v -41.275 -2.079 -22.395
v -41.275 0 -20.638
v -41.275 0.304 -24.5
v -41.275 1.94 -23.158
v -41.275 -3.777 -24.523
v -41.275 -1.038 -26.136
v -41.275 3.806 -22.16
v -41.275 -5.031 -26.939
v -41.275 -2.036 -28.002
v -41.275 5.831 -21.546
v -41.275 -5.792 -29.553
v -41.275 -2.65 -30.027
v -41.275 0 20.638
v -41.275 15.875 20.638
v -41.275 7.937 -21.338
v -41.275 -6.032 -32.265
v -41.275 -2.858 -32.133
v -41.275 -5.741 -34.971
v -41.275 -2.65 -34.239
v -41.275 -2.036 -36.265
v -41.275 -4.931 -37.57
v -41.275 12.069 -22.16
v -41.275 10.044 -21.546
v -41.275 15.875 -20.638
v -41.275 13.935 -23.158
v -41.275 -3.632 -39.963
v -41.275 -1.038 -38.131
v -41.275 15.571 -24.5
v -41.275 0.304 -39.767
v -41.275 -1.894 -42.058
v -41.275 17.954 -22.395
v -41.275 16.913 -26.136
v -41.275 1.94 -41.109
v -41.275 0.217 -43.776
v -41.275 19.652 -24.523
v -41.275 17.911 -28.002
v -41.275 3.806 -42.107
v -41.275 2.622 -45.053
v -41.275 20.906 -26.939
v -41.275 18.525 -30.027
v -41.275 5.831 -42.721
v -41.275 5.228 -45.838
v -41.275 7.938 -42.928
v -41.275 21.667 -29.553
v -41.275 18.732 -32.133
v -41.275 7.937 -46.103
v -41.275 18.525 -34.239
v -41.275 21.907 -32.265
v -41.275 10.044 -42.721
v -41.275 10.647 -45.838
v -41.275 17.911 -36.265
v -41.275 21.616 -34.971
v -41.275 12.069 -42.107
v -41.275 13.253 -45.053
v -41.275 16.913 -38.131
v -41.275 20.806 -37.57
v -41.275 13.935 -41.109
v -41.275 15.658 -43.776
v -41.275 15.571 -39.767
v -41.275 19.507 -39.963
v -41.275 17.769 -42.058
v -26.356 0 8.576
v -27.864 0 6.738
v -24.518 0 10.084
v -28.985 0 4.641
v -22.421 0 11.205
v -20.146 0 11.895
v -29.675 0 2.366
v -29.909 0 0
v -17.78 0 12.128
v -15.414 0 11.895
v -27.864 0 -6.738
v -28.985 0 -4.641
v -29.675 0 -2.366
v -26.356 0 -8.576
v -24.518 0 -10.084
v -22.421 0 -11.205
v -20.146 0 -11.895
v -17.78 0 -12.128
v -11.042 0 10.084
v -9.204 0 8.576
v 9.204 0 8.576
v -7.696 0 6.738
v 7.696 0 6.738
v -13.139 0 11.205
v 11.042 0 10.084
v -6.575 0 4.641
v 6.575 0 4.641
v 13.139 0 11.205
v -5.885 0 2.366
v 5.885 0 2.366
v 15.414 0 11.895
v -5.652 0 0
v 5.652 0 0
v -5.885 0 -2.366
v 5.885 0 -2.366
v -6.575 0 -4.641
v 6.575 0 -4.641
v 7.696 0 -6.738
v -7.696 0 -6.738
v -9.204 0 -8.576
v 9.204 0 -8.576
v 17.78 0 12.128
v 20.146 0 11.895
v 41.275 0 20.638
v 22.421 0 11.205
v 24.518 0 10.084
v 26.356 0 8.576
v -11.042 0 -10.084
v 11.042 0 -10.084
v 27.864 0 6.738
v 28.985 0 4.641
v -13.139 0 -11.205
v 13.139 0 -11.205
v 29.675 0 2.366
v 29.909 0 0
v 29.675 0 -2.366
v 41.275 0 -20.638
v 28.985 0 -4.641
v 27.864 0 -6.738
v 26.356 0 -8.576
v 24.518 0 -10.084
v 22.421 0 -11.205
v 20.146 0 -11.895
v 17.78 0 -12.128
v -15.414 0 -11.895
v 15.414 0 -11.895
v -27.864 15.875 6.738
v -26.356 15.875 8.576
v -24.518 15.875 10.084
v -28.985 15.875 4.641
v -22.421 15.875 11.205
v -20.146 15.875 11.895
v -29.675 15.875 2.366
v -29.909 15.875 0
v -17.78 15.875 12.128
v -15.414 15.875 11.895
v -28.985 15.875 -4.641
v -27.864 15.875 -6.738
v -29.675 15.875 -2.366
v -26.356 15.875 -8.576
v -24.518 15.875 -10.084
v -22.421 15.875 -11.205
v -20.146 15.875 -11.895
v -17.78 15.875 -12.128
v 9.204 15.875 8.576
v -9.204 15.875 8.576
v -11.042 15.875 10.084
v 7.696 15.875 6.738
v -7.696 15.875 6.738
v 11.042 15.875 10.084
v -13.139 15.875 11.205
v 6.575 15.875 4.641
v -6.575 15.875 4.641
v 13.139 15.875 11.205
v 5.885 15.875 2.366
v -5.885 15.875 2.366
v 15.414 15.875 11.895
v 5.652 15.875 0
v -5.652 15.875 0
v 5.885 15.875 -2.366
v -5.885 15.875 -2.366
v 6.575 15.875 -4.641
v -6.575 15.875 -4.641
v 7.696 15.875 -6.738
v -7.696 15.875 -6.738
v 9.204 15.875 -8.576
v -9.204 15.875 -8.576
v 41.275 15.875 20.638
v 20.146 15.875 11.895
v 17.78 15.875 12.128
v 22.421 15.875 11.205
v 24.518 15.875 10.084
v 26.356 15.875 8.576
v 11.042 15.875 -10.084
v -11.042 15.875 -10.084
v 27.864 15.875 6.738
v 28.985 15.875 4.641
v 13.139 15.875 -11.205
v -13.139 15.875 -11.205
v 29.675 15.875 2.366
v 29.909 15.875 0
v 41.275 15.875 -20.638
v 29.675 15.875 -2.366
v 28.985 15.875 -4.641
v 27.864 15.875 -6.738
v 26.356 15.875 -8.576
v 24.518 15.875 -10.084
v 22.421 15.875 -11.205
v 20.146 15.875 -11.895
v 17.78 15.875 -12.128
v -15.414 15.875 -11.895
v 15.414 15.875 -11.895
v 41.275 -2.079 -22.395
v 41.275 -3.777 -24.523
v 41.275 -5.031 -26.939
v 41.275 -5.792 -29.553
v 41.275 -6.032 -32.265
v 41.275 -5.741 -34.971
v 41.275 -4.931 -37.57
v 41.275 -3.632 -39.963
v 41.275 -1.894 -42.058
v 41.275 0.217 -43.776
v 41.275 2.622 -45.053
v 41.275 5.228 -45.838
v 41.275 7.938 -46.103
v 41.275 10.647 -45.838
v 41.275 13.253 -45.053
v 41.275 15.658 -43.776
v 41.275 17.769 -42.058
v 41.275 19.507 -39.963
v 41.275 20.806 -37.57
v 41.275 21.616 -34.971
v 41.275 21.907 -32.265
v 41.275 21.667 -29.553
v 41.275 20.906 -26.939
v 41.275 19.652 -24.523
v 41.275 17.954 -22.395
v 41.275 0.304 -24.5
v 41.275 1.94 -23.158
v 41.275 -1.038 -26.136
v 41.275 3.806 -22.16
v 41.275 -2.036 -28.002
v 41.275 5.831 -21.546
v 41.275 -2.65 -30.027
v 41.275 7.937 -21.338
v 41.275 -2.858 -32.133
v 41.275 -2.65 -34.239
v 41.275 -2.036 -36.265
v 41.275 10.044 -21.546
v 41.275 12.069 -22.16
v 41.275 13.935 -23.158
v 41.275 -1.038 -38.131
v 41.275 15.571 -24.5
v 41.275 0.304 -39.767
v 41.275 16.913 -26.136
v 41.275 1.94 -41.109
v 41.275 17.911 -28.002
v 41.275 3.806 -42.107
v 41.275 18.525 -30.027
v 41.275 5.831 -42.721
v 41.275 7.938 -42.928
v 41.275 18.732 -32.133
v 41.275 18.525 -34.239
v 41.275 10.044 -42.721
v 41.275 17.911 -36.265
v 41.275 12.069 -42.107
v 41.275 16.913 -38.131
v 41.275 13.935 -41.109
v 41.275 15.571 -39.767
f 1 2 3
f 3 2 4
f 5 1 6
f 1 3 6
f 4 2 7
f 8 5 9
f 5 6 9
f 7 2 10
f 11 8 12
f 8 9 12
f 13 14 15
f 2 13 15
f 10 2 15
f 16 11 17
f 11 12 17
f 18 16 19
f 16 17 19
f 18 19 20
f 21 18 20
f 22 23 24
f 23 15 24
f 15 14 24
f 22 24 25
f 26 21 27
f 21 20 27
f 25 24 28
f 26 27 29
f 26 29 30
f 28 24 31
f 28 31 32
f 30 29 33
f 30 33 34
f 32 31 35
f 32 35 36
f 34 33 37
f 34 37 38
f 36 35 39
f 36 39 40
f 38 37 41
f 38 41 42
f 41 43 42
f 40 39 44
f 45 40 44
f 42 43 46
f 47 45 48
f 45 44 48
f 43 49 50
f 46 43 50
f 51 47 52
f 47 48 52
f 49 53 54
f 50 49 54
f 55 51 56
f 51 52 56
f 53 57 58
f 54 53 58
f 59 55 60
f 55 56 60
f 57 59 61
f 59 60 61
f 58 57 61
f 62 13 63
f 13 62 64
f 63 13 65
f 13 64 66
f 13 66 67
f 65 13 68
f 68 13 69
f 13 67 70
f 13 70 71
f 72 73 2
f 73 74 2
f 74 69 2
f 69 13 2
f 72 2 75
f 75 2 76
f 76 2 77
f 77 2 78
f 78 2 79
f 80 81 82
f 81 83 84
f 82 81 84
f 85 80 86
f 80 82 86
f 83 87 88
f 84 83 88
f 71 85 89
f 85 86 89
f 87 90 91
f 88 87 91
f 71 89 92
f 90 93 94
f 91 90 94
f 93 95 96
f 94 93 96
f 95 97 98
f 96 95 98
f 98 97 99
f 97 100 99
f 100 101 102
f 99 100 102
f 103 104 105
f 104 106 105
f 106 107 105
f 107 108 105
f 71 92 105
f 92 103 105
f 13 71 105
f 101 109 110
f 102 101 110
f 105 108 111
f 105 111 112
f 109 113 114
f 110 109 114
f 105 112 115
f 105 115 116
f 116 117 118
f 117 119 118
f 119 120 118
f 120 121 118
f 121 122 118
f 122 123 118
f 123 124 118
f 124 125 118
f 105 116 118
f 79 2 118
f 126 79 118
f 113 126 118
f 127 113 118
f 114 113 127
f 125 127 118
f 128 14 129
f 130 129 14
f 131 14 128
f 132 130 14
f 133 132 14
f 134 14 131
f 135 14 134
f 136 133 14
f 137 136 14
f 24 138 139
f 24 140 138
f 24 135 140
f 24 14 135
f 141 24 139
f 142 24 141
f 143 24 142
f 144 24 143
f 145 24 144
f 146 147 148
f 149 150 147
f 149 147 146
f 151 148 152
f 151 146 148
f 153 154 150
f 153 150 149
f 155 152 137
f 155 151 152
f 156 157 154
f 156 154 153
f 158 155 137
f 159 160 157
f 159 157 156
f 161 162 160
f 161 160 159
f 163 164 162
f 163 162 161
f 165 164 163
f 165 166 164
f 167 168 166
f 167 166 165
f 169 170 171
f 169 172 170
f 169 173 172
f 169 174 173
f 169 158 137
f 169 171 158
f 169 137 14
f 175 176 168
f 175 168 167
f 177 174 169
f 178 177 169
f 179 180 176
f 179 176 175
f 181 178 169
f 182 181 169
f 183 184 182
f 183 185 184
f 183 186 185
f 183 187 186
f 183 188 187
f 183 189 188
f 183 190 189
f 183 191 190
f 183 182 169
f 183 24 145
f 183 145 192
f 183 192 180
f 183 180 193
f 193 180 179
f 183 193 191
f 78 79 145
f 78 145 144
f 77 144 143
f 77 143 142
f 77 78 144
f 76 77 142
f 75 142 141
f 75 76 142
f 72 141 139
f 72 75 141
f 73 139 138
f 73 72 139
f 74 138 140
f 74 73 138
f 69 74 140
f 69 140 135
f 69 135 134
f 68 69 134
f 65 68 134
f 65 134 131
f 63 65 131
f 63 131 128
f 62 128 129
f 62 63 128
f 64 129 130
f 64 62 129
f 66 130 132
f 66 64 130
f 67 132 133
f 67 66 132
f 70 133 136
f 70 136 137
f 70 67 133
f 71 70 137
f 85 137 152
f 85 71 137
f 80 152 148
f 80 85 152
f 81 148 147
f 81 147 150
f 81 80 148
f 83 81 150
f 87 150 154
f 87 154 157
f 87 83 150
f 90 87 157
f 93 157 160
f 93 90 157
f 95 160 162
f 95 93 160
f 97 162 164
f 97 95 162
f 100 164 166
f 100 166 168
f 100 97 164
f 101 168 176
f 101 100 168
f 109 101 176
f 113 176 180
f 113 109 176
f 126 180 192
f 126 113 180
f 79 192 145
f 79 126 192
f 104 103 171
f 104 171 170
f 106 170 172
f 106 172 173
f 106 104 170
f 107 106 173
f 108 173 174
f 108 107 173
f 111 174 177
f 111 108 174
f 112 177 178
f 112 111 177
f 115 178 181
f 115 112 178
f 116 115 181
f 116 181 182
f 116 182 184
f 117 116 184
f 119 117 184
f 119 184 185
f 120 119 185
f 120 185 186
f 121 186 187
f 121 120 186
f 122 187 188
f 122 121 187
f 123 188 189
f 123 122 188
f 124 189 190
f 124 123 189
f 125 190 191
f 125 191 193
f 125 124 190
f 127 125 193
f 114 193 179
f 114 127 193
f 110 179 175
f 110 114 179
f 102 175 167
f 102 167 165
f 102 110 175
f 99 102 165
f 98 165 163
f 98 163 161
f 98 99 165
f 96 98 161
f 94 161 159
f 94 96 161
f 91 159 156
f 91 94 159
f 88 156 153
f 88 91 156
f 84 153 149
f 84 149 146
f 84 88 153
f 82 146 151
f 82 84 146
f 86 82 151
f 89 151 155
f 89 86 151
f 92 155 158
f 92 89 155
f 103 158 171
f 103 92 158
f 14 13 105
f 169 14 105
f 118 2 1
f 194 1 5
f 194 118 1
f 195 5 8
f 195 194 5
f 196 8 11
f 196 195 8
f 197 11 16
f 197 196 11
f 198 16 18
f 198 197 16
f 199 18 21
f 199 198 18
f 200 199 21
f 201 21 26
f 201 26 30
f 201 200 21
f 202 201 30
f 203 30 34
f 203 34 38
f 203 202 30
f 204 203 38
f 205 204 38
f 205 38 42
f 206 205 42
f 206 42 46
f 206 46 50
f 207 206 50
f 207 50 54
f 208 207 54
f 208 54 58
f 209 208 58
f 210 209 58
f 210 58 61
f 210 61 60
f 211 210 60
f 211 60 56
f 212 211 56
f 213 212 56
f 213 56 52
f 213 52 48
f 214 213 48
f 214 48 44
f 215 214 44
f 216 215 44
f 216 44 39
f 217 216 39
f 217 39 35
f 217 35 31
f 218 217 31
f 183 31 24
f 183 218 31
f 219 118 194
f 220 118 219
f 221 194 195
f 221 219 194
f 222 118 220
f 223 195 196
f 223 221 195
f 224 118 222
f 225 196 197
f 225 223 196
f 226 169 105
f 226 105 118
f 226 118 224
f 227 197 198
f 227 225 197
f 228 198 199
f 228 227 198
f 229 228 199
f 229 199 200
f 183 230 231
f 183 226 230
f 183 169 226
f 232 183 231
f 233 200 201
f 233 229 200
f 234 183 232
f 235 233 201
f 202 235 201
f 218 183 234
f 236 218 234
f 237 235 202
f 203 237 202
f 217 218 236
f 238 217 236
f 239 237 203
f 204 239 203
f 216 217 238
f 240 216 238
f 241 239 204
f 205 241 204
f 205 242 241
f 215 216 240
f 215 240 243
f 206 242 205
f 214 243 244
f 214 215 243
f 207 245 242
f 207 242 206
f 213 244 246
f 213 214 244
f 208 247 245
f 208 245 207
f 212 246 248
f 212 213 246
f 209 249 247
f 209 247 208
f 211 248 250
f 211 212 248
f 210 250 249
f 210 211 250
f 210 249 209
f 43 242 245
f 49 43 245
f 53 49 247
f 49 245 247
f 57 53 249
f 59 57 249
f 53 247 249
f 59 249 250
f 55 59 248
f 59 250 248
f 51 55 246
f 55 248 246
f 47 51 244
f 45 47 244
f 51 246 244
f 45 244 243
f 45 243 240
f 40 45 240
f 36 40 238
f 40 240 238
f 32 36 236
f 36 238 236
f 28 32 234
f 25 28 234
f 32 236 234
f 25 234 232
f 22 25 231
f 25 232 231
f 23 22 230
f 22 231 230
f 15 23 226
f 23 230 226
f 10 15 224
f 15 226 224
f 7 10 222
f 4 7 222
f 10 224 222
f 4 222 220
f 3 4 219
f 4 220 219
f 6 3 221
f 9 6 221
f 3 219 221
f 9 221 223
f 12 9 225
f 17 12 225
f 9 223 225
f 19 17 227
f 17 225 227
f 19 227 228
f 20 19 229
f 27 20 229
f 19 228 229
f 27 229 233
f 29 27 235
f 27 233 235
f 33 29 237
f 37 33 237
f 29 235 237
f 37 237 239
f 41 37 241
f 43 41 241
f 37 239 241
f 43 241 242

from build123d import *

# Parameters (mm, degrees)
SKETCH1_W           = 82.55
SKETCH1_H           = 41.275
SKETCH1_R           = 12.1285
BOSS_EXTRUDE1_DEPTH = 15.875
SKETCH2_R           = 13.97
SKETCH2_R_2         = 10.795
BOSS_EXTRUDE2_DEPTH = 82.55


with BuildPart() as part:
    # Sketch1 → Boss-Extrude1 (new body)
    with BuildSketch(Plane(origin=(0, 0, 0), x_dir=(1, 0, 0), z_dir=(0, 1, 0))):
        Rectangle(SKETCH1_W, SKETCH1_H)
        with Locations(Location((17.78, 0, 0), (0, 0, 270))):
            Circle(SKETCH1_R, mode=Mode.SUBTRACT)
        with Locations(Location((-17.78, 0, 0), (0, 0, 90))):
            Circle(SKETCH1_R, mode=Mode.SUBTRACT)
    extrude(amount=BOSS_EXTRUDE1_DEPTH)

    # Sketch2 → Boss-Extrude2 (add)
    with BuildSketch(Plane(origin=(41.275, 0, 0), x_dir=(0, 0, -1), z_dir=(1, 0, 0))):
        with Locations((32.133455539, 7.9375)):
            Circle(SKETCH2_R)
        with Locations((32.133455539, 7.9375)):
            Circle(SKETCH2_R_2, mode=Mode.SUBTRACT)
    extrude(amount=-BOSS_EXTRUDE2_DEPTH)


solid = part.part
